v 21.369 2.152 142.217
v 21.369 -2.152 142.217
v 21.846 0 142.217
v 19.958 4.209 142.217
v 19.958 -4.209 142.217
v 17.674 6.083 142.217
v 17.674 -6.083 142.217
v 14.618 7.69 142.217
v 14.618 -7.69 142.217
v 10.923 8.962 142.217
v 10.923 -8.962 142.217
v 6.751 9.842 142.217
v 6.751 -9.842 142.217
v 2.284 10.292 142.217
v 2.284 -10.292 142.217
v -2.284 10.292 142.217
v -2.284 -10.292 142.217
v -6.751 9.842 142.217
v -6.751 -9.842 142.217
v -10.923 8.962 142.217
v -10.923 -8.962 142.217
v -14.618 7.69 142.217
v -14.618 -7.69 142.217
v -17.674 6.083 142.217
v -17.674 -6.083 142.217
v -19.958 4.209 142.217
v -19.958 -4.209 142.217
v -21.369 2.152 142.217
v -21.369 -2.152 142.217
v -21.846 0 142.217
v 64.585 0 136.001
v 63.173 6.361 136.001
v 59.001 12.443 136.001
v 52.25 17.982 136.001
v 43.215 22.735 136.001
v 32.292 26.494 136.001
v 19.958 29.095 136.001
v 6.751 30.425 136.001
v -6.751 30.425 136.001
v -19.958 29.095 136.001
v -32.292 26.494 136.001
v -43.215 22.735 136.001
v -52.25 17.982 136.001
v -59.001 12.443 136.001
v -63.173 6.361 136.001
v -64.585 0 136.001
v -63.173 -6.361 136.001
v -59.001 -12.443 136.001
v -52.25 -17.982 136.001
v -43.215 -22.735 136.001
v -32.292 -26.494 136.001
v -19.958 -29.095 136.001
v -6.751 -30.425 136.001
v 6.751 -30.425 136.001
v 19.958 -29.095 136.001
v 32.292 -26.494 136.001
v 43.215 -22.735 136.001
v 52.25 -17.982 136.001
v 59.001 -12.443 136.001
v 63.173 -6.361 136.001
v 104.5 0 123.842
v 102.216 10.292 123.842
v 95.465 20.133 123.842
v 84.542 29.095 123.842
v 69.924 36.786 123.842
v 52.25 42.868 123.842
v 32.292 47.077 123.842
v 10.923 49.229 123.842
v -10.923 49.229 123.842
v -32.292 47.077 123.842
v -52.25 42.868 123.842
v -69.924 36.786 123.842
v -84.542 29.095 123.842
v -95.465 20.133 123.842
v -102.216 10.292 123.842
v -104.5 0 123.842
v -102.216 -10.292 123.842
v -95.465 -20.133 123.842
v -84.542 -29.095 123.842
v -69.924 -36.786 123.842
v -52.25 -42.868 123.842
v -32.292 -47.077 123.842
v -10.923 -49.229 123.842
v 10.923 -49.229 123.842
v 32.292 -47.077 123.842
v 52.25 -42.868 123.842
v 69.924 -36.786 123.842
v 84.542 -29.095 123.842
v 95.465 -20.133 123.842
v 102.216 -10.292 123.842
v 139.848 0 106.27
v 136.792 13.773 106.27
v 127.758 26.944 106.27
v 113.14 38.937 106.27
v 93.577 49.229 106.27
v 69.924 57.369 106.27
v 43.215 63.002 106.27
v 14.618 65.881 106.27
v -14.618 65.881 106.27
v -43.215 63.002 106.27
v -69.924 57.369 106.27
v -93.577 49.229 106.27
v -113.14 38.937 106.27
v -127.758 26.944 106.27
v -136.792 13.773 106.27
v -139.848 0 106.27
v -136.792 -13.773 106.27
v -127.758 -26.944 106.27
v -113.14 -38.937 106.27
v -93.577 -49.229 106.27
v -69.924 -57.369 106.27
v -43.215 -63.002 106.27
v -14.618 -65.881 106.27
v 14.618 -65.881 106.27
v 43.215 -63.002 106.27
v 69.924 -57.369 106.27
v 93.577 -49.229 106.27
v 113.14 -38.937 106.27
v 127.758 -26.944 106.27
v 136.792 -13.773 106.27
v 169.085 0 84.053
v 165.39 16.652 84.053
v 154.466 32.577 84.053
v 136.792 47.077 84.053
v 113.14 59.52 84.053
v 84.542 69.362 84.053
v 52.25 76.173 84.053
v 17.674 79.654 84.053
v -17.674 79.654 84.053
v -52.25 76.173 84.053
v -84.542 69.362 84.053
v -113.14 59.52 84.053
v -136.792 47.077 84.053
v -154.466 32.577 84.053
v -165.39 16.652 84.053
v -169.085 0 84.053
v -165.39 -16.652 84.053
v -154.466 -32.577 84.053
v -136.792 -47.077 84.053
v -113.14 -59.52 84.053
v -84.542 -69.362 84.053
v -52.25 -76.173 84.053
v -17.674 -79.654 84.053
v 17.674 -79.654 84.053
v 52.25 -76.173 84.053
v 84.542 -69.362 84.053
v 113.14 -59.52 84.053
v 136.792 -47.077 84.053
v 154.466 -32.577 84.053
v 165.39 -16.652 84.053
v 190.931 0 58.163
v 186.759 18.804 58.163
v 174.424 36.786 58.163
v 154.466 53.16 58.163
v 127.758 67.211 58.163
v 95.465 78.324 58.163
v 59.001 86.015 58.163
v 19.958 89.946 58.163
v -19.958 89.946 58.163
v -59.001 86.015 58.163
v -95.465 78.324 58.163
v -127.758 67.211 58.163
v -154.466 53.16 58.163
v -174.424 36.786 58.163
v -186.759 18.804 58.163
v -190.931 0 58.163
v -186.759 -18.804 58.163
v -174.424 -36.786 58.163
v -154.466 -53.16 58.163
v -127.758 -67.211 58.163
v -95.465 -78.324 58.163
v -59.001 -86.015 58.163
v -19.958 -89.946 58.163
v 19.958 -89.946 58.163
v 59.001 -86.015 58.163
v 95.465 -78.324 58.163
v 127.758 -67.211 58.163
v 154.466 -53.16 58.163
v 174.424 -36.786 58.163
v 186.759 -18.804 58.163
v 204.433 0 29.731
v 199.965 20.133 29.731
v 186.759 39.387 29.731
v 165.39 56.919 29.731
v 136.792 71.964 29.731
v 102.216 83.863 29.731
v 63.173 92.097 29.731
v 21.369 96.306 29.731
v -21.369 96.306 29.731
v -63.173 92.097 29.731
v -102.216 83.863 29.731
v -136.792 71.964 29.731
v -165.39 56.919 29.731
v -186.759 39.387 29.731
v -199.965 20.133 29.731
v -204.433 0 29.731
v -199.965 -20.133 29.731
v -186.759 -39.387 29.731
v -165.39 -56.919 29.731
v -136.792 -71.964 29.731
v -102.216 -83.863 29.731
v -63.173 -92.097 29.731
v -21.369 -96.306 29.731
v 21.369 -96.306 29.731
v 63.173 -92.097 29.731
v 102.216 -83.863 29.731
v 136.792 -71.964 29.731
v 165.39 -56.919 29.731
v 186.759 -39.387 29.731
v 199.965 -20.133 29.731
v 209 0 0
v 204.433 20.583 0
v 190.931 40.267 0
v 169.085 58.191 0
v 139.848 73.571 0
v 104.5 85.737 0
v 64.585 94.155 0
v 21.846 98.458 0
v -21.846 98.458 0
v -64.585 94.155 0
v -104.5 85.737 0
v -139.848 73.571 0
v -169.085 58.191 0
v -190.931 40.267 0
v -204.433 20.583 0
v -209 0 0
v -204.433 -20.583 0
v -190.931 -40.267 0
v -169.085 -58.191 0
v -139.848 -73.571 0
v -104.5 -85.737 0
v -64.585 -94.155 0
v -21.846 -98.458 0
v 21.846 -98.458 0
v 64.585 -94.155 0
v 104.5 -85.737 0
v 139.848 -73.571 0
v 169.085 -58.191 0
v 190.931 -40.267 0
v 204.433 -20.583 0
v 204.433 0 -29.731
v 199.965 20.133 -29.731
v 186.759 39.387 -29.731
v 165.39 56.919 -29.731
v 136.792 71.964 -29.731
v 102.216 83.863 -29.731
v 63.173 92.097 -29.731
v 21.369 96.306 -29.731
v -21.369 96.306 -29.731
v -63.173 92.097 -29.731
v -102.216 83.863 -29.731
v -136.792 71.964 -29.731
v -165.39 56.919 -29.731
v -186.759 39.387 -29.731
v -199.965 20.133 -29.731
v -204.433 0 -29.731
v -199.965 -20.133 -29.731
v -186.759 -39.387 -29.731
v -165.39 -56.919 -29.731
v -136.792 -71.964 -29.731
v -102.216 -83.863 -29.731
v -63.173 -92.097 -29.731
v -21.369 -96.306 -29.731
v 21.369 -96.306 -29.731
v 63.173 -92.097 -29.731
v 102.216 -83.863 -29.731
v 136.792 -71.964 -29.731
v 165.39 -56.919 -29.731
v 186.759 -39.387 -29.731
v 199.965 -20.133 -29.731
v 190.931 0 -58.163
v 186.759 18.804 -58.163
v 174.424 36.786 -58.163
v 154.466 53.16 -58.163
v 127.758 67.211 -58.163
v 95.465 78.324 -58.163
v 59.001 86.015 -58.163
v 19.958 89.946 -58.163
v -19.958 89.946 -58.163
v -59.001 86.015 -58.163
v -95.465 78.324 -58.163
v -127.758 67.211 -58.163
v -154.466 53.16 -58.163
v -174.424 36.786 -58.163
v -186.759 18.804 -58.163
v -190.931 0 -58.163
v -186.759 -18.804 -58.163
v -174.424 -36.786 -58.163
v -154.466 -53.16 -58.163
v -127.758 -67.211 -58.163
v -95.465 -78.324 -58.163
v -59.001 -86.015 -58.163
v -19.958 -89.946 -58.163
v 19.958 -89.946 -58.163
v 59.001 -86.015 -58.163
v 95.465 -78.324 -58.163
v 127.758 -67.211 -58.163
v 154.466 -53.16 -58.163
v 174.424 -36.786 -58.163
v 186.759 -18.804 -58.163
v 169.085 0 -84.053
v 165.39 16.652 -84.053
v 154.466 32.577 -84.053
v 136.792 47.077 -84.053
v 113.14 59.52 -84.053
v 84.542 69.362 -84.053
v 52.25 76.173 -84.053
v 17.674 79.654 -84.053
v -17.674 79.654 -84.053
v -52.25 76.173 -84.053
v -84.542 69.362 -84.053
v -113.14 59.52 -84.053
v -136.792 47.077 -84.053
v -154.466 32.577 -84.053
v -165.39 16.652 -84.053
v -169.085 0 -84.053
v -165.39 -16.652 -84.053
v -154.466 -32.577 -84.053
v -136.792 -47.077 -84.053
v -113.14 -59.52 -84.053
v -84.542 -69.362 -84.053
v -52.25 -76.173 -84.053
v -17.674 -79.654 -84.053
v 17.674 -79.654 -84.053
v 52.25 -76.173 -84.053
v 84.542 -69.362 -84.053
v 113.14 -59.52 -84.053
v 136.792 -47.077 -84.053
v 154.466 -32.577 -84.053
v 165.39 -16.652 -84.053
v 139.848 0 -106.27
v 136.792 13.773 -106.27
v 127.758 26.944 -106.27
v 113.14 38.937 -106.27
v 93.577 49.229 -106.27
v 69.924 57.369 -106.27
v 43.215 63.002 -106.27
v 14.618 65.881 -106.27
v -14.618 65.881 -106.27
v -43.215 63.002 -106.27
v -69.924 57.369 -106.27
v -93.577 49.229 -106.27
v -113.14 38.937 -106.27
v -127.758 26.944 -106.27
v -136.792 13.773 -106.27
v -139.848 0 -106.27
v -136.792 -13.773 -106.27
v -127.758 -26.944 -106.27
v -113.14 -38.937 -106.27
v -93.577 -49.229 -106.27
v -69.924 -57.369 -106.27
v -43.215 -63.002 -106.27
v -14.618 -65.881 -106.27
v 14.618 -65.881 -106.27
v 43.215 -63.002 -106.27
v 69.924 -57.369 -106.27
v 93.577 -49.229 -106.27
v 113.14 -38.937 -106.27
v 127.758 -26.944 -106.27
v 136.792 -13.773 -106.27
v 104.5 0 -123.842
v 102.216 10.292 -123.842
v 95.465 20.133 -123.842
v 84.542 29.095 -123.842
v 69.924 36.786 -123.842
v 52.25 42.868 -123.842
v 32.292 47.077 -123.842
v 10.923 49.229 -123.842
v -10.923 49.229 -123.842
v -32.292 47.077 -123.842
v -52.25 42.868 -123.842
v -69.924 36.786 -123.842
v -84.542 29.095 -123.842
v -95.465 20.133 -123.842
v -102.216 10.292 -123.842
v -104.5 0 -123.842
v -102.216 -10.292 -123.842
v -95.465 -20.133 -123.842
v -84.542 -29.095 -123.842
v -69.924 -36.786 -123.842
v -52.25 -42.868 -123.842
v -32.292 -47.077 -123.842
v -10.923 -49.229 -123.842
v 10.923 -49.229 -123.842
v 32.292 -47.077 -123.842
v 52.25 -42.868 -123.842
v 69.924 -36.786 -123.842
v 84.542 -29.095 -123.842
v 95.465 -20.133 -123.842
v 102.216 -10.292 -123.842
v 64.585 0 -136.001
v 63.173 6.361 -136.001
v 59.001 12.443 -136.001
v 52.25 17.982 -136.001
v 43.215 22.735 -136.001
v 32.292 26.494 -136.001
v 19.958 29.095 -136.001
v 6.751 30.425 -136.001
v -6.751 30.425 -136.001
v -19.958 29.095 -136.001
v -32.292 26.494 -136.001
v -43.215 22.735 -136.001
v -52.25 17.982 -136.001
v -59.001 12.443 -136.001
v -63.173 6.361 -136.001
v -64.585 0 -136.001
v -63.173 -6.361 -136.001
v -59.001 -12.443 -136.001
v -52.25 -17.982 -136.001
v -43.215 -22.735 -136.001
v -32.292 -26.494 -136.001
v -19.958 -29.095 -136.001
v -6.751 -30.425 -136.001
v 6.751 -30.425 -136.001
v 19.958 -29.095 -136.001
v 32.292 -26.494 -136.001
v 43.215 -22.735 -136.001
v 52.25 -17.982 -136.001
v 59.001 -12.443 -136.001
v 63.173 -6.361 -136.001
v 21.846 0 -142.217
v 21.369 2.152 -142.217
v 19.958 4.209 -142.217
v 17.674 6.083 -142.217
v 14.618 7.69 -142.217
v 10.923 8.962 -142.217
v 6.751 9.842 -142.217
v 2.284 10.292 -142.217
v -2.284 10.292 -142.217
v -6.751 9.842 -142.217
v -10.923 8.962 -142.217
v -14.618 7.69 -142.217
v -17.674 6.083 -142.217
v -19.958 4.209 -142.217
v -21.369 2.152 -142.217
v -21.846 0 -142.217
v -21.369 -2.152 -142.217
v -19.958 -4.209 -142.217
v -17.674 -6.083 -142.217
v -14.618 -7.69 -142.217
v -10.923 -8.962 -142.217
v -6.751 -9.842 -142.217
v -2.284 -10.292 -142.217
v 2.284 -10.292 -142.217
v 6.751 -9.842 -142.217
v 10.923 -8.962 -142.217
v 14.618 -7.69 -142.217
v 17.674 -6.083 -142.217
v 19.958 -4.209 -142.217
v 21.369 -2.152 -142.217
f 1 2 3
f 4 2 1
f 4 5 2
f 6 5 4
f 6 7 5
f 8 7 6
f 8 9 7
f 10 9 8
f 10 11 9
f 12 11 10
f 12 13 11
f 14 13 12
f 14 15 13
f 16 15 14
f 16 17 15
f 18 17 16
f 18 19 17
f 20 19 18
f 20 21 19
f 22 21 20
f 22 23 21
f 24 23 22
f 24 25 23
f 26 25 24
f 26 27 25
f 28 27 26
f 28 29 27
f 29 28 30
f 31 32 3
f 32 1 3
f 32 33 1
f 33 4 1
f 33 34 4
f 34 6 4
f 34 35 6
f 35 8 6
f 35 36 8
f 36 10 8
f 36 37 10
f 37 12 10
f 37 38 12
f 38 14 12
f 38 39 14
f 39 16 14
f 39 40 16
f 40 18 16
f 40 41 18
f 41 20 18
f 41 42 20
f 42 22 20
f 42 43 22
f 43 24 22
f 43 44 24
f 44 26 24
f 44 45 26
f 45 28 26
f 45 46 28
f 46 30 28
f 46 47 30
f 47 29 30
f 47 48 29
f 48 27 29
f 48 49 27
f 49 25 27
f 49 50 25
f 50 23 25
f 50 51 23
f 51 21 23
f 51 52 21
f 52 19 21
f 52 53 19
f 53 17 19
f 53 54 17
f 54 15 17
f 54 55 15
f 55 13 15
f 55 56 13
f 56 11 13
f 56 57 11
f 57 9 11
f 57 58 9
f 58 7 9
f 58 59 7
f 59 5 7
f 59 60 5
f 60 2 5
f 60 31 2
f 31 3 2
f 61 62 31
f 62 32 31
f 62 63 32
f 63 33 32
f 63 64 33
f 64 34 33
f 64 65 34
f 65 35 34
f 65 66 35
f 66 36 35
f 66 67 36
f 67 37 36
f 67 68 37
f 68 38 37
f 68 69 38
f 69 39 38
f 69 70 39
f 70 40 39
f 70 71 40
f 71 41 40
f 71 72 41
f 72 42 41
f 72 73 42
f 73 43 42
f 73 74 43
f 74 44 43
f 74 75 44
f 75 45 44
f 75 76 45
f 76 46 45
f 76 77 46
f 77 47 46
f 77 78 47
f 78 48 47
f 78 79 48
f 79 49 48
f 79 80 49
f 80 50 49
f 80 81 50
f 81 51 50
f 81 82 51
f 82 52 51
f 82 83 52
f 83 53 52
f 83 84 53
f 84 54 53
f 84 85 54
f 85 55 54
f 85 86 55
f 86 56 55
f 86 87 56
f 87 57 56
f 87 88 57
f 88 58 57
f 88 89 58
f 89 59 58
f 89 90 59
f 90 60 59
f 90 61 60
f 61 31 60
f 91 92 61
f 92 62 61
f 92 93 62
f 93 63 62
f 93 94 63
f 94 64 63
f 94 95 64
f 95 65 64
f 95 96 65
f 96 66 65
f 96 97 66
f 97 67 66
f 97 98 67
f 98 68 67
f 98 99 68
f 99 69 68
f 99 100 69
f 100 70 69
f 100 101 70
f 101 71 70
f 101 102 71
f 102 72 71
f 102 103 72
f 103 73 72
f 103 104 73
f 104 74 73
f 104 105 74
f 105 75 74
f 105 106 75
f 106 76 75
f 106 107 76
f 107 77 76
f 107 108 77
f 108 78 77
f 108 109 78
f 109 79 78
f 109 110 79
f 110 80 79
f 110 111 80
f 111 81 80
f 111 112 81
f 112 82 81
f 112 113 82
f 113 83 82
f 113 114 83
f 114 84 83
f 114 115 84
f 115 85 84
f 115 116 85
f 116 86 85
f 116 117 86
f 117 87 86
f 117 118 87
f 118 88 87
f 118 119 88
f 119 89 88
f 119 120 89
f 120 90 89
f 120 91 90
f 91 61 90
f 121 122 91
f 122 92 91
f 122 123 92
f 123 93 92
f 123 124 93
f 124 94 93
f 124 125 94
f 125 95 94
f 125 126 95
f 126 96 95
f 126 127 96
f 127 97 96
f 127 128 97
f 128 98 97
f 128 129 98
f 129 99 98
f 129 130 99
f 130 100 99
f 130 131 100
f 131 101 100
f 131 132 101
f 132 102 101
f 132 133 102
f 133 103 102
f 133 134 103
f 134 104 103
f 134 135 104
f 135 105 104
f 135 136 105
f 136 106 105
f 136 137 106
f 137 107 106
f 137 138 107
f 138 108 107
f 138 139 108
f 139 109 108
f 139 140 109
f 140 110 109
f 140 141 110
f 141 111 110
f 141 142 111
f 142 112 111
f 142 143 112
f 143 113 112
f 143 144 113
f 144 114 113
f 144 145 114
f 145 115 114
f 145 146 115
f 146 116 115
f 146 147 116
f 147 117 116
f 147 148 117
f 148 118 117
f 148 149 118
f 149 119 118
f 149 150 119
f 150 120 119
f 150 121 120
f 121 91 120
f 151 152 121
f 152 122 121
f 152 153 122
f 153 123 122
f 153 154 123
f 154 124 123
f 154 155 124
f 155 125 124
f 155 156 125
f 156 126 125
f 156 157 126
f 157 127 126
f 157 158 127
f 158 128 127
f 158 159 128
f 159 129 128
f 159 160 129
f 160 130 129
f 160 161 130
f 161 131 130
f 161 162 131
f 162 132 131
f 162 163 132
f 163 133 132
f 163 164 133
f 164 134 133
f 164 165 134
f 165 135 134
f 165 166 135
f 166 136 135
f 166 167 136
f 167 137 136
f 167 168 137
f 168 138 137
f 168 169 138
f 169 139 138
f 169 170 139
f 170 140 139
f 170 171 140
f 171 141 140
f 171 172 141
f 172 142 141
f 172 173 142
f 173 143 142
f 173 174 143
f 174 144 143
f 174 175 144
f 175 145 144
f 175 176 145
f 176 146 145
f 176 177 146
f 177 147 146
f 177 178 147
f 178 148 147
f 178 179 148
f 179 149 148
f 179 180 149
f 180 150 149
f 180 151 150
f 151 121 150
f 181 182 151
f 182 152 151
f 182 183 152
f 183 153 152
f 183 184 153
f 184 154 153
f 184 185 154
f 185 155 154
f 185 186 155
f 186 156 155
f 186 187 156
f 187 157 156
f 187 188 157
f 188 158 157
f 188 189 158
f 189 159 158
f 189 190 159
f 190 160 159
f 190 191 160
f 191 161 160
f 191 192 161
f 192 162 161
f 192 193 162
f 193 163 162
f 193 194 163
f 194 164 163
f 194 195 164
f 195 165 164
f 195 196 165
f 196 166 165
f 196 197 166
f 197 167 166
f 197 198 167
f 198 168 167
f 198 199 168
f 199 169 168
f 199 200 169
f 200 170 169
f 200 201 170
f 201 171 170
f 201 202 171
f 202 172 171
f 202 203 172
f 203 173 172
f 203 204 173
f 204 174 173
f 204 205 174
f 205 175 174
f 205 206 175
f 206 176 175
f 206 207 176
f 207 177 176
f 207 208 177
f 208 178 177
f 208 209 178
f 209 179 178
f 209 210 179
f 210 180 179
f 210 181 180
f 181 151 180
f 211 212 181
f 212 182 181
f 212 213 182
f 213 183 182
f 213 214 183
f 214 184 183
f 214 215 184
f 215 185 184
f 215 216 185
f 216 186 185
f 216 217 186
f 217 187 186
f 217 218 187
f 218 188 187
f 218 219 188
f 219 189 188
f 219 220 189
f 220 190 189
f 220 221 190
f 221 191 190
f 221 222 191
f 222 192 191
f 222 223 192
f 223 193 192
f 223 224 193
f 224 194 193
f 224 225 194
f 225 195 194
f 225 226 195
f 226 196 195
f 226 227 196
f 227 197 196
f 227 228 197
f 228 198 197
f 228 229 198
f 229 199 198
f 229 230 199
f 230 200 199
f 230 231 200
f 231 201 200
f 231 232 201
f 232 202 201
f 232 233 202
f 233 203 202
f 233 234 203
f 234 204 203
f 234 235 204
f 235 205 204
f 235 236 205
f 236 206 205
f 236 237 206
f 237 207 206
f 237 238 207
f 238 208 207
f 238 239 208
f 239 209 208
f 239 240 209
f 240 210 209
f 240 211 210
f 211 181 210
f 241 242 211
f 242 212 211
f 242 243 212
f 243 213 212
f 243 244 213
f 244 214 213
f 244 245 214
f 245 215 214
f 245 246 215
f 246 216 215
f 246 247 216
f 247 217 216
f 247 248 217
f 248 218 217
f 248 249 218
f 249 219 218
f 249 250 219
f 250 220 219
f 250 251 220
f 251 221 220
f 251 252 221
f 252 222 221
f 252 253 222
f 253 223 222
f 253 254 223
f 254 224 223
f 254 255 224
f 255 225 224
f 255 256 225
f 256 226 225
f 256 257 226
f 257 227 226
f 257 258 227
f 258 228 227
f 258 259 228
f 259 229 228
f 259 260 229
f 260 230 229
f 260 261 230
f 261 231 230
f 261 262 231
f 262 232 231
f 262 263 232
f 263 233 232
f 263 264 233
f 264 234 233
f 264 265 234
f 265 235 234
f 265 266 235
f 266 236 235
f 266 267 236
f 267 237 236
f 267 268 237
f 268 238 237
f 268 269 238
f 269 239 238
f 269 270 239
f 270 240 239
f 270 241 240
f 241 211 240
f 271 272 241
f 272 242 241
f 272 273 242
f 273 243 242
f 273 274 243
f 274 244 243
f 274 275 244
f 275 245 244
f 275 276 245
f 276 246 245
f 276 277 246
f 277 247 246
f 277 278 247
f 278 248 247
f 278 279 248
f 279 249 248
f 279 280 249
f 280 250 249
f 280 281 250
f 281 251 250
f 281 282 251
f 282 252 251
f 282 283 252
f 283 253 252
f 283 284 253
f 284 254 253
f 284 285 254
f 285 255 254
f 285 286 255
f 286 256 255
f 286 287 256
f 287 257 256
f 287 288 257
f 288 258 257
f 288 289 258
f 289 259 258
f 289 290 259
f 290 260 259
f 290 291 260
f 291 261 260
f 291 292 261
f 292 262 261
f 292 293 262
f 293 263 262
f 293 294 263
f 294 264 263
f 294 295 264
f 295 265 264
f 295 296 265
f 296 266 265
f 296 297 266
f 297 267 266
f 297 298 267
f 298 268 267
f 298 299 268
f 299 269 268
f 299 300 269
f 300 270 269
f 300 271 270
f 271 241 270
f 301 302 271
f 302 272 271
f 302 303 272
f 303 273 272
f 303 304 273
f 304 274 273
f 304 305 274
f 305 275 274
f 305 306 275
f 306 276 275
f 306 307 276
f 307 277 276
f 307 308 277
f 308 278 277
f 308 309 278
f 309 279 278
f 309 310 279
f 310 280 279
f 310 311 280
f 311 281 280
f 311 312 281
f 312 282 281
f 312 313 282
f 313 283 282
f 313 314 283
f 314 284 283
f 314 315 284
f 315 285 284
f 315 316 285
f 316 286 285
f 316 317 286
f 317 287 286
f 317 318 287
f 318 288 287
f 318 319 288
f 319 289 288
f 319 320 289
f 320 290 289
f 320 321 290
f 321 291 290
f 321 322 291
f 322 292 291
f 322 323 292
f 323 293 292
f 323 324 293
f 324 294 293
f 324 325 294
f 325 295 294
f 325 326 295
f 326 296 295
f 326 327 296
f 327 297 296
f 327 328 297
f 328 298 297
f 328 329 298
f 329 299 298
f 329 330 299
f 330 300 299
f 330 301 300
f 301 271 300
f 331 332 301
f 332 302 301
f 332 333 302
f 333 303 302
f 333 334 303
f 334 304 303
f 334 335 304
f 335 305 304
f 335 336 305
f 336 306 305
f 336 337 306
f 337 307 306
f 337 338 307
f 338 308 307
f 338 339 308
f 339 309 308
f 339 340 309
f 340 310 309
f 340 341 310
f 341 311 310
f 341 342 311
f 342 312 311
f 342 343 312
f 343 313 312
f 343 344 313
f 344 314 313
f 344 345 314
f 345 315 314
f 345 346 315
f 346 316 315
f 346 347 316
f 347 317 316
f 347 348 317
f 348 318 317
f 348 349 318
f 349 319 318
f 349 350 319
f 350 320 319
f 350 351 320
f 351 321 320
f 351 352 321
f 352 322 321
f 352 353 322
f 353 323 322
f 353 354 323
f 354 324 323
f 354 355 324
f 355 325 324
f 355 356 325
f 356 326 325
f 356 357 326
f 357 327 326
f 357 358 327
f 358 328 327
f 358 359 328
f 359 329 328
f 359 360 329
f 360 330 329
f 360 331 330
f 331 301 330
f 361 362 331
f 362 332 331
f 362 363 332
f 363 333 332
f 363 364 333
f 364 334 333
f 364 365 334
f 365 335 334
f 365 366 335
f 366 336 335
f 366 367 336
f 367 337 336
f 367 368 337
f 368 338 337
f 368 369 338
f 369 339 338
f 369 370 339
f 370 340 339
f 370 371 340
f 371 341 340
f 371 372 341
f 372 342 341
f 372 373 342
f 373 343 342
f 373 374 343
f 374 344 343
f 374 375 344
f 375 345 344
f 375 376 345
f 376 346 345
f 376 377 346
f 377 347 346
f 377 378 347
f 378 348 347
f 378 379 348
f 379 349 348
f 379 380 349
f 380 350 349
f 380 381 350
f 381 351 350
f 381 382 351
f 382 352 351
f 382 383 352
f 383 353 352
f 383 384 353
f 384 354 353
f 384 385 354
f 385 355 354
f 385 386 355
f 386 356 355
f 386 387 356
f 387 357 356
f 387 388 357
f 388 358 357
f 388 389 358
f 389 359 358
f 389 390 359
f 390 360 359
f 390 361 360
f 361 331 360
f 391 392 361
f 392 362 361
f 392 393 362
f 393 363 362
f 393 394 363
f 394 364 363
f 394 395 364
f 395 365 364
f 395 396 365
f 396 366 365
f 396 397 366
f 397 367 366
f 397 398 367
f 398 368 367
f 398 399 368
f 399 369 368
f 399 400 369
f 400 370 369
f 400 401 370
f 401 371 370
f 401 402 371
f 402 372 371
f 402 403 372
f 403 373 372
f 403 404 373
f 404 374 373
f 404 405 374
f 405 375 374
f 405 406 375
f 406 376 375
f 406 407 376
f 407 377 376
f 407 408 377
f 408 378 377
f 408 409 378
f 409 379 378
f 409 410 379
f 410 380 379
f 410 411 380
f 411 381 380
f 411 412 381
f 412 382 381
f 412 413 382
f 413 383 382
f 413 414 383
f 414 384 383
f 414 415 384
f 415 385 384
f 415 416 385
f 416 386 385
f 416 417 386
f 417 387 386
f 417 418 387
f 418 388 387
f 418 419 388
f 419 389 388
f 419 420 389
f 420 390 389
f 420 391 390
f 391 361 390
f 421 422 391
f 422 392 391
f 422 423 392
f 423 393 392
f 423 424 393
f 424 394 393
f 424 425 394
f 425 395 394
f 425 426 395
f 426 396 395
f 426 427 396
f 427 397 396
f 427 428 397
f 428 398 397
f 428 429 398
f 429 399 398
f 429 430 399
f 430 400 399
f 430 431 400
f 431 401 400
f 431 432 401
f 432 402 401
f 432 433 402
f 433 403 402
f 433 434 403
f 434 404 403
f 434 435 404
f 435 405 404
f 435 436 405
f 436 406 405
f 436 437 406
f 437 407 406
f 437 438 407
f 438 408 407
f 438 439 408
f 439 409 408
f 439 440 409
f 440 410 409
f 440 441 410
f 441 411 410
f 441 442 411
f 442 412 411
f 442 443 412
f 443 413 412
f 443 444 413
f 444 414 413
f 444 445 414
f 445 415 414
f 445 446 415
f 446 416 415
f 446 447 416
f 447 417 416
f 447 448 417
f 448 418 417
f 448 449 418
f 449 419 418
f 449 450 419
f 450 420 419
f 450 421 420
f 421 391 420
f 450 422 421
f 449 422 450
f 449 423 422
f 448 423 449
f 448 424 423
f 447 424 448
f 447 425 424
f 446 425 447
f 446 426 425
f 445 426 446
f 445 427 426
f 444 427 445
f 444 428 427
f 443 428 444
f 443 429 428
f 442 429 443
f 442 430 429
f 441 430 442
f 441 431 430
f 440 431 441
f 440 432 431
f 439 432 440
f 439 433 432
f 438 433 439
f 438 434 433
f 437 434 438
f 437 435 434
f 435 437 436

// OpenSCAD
// Generated by SolidPython 1.0.1 on 2020-07-29 00:46:54


scale(v = [19, 9, 13]) {
	sphere(r = 11);
}
/***********************************************
*********      SolidPython code:      **********
************************************************
 
# import packages: SolidPython
from solid import *
from solid.utils import *
from itertools import chain, combinations, permutations


class Resize:

    def __init__(self, scad_file):
        self.scad_file = scad_file
        #self.scad_file = import_scad(scad_file)
        # cone/cylinder param:
        self.r1 = 0
        self.r2 = 0
        self.h = 0
        # rectangular prism param:
        self.w = 0
        self.l = 0
        # ellipse param:
        self.r = 0

    # import OpenScad code (file name corresponds to shape)


    # classify shape + parameters
    def assign(self, param1, param2, param3):
        if self.scad_file == 'cone.scad':
            self.r1 = param1
            self.r2 = param2
            self.h = param3
        elif self.scad_file == 'cylinder.scad':
            self.r1 = param1
            self.r2 = param2
            self.h = param3
        elif self.scad_file == 'rectangularPrism.scad':
            self.h = param1
            self.l = param2
            self.w = param3
        else:
            self.r = param1
            self.h = param2

    # resize parameters
    def iterate(self):
        x = range(3, 20, 2)
        i = 1
        if self.scad_file == 'cone.scad':
            tempList = list(permutations(x, 2))
            for temp in tempList:
                param1 = temp[0]
                param2 = temp[1]
                filepath = 'produced_scad_files/' + 'cone' + str(param1) + '_' + str(param2) + '_' + '.scad'
                scad_render_to_file(cylinder(h=param1, r1=param2, r2=0), filepath)

        elif self.scad_file == 'cylinder.scad':
            tempList = list(permutations(x, 3))
            for temp in tempList:
                param1 = temp[0]
                param2 = temp[1]
                filepath = 'produced_scad_files/' + 'cylinder' + str(param1) + '_' + str(param2) + '_' + '.scad'
                scad_render_to_file(cylinder(h=param1, r1=param2, r2=param2), filepath)

        elif self.scad_file == 'rectangularPrism.scad':
            tempList = list(permutations(x, 3))
            for temp in tempList:
                param1 = temp[0]
                param2 = temp[1]
                param3 = temp[2]
                filepath = 'produced_scad_files/' + 'rectangularPrism' + str(param1) + '_' + str(param2) + '_' + str(
                    param3) + '.scad'
                scad_render_to_file(cube(size=(param1, param2, param3)), filepath)

        elif self.scad_file == 'ellipse.scad':
            tempList = list(permutations(x, 4))
            for temp in tempList:
                param1 = temp[0]
                param2 = temp[1]
                param3 = temp[2]
                param4 = temp[3]
                filepath = 'produced_scad_files/' + 'ellipse' + str(param1) + '_' + str(param2) + '_' + str(param3) + '_' + str(param4) + '.scad'
                scad_render_to_file(scale([param1, param2, param3])(sphere(r=param4)), filepath)

    def render_to_scadfile(self):
        scad_render_to_file(scad, 'example.scad') 
 
************************************************/
